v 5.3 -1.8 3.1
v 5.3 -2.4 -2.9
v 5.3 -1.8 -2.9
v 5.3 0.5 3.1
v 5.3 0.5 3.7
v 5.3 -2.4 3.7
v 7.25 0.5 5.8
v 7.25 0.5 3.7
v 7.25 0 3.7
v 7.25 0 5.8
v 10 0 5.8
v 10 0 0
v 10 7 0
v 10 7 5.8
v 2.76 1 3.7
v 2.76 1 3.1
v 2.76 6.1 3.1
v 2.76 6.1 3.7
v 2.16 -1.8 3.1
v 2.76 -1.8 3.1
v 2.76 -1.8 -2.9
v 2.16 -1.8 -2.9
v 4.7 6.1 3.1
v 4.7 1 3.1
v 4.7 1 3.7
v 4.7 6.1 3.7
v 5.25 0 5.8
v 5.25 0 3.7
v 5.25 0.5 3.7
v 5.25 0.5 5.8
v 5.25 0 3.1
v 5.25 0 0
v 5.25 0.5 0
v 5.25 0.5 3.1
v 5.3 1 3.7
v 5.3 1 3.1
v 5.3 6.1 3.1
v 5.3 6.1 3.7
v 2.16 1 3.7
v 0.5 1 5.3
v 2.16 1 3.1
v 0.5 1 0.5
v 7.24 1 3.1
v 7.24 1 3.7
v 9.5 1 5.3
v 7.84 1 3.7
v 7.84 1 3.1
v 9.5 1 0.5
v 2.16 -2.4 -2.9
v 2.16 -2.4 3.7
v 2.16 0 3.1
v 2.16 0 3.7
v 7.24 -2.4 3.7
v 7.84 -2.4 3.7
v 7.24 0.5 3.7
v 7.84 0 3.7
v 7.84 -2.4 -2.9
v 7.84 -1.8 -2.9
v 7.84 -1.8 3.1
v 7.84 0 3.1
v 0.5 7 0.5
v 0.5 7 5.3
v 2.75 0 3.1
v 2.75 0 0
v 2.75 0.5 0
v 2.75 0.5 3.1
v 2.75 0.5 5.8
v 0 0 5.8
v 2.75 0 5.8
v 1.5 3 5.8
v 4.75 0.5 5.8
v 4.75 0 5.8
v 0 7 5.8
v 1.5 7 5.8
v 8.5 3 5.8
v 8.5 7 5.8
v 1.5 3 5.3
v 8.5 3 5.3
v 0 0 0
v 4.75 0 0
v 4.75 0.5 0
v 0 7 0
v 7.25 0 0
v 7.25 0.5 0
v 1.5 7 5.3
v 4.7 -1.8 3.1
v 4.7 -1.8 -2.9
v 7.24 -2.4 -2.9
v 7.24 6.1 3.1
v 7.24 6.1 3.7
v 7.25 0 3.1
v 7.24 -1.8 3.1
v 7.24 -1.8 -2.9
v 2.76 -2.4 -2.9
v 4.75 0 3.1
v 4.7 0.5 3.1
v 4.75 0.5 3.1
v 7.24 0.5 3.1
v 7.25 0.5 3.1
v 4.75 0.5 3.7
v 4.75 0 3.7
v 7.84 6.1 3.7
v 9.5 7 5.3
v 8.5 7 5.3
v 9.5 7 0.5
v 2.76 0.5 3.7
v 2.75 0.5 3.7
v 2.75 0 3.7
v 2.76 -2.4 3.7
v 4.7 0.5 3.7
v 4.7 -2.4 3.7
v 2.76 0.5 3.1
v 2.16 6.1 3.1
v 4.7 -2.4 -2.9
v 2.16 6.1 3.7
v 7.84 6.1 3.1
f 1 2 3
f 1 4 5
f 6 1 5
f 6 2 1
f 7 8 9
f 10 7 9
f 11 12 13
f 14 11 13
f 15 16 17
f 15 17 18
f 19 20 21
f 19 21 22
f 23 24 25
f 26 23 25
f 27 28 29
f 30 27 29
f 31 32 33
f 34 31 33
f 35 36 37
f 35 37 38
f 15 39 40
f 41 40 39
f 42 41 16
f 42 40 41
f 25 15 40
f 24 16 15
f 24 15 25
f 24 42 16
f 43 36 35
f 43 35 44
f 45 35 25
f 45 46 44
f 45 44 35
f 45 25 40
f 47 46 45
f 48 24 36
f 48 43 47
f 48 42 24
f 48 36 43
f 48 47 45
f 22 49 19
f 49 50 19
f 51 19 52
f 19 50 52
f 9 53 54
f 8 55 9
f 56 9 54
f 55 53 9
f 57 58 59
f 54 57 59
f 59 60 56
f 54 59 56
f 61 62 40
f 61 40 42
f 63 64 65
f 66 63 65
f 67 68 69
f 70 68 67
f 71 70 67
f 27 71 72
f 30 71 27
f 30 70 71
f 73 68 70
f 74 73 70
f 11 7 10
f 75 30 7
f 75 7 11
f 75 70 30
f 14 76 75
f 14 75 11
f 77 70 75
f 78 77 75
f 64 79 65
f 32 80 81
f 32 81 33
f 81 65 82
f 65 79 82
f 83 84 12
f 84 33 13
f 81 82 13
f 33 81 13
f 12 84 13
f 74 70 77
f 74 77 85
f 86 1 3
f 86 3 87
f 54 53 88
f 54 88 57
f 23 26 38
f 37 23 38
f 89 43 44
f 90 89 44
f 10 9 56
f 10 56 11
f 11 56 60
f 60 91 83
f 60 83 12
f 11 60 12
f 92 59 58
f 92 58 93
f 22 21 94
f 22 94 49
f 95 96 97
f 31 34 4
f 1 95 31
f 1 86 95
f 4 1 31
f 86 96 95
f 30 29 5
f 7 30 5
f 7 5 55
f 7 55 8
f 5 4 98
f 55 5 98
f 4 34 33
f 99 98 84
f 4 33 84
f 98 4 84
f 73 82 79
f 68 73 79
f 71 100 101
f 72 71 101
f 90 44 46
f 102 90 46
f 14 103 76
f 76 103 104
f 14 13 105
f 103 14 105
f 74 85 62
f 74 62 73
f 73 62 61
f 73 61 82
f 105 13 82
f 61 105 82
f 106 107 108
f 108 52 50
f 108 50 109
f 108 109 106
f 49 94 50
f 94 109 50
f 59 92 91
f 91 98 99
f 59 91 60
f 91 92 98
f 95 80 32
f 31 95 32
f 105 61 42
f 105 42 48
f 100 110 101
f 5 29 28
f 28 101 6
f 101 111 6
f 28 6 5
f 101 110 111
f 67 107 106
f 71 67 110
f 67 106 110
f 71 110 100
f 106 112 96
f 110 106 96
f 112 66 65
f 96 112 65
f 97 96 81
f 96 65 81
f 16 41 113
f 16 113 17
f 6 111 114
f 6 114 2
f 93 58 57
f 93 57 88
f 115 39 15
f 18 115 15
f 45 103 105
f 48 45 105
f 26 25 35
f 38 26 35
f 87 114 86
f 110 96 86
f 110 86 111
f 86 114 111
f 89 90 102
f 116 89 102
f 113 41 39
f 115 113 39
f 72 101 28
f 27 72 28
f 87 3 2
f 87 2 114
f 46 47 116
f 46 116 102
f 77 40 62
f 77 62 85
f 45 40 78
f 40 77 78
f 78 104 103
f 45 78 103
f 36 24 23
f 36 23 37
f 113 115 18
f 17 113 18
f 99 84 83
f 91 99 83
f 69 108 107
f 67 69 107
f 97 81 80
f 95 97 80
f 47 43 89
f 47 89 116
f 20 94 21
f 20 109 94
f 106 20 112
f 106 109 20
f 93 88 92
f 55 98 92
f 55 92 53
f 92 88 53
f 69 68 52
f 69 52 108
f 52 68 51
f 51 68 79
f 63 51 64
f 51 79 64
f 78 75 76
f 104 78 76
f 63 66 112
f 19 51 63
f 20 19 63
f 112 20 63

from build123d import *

# Parameters (mm, degrees)
EXTRUDE_1_DEPTH      = 5.8
SKETCH_2_W           = 9
SKETCH_2_H           = 4.8
CUT_EXTRUDE_1_DEPTH  = 6
SKETCH_3_W           = 0.6
SKETCH_3_H           = 0.6
EXTRUDE_2_DEPTH      = 2.4
EXTRUDE_2_DEPTH_BACK = 6.1
SKETCH_5_W           = 7
SKETCH_5_H           = 4
CUT_EXTRUDE_2_DEPTH  = 1
SKETCH_6_W           = 0.6
SKETCH_6_H           = 0.6
EXTRUDE_3_DEPTH      = 6


with BuildPart() as part:
    # 草图1 → 凸台-拉伸1 (new body)
    with BuildSketch(Plane.XY):
        Polygon((2.75, 0), (2.75, 0.5), (4.75, 0.5), (4.75, 0), (5.25, 0), (5.25, 0.5), (7.25, 0.5), (7.25, 0), (10, 0), (10, 7), (0, 7), (0, 0), align=None)
    extrude(amount=EXTRUDE_1_DEPTH)

    # 草图2 → 切除-拉伸1 (cut)
    with BuildSketch(Plane(origin=(0, 7, 0), x_dir=(1, 0, 0), z_dir=(0, 1, 0))):
        with Locations((5, -2.9)):
            Rectangle(SKETCH_2_W, SKETCH_2_H)
    extrude(amount=-CUT_EXTRUDE_1_DEPTH, mode=Mode.SUBTRACT)

    # 草图3 → 凸台-拉伸2 (add, two sides)
    with BuildSketch(Plane.XZ) as extrude_2_sk:
        with Locations((2.46, 3.4)):
            Rectangle(SKETCH_3_W, SKETCH_3_H)
        with Locations((5, 3.4)):
            Rectangle(SKETCH_3_W, SKETCH_3_H)
        with Locations((7.54, 3.4)):
            Rectangle(SKETCH_3_W, SKETCH_3_H)
    extrude(amount=EXTRUDE_2_DEPTH)
    extrude(extrude_2_sk.sketch, amount=-EXTRUDE_2_DEPTH_BACK)

    # 草图5 → 切除-拉伸2 (cut)
    with BuildSketch(Plane.XY.offset(5.8)):
        with Locations((5, 5)):
            Rectangle(SKETCH_5_W, SKETCH_5_H)
    extrude(amount=-CUT_EXTRUDE_2_DEPTH, mode=Mode.SUBTRACT)

    # 草图6 → 凸台-拉伸3 (add)
    with BuildSketch(Plane(origin=(0, 0, 3.1), x_dir=(-1, 0, 0), z_dir=(0, 0, -1))):
        with Locations((-2.46, -2.1)):
            Rectangle(SKETCH_6_W, SKETCH_6_H)
        with Locations((-5, -2.1)):
            Rectangle(SKETCH_6_W, SKETCH_6_H)
        with Locations((-7.54, -2.1)):
            Rectangle(SKETCH_6_W, SKETCH_6_H)
    extrude(amount=EXTRUDE_3_DEPTH)


solid = part.part
